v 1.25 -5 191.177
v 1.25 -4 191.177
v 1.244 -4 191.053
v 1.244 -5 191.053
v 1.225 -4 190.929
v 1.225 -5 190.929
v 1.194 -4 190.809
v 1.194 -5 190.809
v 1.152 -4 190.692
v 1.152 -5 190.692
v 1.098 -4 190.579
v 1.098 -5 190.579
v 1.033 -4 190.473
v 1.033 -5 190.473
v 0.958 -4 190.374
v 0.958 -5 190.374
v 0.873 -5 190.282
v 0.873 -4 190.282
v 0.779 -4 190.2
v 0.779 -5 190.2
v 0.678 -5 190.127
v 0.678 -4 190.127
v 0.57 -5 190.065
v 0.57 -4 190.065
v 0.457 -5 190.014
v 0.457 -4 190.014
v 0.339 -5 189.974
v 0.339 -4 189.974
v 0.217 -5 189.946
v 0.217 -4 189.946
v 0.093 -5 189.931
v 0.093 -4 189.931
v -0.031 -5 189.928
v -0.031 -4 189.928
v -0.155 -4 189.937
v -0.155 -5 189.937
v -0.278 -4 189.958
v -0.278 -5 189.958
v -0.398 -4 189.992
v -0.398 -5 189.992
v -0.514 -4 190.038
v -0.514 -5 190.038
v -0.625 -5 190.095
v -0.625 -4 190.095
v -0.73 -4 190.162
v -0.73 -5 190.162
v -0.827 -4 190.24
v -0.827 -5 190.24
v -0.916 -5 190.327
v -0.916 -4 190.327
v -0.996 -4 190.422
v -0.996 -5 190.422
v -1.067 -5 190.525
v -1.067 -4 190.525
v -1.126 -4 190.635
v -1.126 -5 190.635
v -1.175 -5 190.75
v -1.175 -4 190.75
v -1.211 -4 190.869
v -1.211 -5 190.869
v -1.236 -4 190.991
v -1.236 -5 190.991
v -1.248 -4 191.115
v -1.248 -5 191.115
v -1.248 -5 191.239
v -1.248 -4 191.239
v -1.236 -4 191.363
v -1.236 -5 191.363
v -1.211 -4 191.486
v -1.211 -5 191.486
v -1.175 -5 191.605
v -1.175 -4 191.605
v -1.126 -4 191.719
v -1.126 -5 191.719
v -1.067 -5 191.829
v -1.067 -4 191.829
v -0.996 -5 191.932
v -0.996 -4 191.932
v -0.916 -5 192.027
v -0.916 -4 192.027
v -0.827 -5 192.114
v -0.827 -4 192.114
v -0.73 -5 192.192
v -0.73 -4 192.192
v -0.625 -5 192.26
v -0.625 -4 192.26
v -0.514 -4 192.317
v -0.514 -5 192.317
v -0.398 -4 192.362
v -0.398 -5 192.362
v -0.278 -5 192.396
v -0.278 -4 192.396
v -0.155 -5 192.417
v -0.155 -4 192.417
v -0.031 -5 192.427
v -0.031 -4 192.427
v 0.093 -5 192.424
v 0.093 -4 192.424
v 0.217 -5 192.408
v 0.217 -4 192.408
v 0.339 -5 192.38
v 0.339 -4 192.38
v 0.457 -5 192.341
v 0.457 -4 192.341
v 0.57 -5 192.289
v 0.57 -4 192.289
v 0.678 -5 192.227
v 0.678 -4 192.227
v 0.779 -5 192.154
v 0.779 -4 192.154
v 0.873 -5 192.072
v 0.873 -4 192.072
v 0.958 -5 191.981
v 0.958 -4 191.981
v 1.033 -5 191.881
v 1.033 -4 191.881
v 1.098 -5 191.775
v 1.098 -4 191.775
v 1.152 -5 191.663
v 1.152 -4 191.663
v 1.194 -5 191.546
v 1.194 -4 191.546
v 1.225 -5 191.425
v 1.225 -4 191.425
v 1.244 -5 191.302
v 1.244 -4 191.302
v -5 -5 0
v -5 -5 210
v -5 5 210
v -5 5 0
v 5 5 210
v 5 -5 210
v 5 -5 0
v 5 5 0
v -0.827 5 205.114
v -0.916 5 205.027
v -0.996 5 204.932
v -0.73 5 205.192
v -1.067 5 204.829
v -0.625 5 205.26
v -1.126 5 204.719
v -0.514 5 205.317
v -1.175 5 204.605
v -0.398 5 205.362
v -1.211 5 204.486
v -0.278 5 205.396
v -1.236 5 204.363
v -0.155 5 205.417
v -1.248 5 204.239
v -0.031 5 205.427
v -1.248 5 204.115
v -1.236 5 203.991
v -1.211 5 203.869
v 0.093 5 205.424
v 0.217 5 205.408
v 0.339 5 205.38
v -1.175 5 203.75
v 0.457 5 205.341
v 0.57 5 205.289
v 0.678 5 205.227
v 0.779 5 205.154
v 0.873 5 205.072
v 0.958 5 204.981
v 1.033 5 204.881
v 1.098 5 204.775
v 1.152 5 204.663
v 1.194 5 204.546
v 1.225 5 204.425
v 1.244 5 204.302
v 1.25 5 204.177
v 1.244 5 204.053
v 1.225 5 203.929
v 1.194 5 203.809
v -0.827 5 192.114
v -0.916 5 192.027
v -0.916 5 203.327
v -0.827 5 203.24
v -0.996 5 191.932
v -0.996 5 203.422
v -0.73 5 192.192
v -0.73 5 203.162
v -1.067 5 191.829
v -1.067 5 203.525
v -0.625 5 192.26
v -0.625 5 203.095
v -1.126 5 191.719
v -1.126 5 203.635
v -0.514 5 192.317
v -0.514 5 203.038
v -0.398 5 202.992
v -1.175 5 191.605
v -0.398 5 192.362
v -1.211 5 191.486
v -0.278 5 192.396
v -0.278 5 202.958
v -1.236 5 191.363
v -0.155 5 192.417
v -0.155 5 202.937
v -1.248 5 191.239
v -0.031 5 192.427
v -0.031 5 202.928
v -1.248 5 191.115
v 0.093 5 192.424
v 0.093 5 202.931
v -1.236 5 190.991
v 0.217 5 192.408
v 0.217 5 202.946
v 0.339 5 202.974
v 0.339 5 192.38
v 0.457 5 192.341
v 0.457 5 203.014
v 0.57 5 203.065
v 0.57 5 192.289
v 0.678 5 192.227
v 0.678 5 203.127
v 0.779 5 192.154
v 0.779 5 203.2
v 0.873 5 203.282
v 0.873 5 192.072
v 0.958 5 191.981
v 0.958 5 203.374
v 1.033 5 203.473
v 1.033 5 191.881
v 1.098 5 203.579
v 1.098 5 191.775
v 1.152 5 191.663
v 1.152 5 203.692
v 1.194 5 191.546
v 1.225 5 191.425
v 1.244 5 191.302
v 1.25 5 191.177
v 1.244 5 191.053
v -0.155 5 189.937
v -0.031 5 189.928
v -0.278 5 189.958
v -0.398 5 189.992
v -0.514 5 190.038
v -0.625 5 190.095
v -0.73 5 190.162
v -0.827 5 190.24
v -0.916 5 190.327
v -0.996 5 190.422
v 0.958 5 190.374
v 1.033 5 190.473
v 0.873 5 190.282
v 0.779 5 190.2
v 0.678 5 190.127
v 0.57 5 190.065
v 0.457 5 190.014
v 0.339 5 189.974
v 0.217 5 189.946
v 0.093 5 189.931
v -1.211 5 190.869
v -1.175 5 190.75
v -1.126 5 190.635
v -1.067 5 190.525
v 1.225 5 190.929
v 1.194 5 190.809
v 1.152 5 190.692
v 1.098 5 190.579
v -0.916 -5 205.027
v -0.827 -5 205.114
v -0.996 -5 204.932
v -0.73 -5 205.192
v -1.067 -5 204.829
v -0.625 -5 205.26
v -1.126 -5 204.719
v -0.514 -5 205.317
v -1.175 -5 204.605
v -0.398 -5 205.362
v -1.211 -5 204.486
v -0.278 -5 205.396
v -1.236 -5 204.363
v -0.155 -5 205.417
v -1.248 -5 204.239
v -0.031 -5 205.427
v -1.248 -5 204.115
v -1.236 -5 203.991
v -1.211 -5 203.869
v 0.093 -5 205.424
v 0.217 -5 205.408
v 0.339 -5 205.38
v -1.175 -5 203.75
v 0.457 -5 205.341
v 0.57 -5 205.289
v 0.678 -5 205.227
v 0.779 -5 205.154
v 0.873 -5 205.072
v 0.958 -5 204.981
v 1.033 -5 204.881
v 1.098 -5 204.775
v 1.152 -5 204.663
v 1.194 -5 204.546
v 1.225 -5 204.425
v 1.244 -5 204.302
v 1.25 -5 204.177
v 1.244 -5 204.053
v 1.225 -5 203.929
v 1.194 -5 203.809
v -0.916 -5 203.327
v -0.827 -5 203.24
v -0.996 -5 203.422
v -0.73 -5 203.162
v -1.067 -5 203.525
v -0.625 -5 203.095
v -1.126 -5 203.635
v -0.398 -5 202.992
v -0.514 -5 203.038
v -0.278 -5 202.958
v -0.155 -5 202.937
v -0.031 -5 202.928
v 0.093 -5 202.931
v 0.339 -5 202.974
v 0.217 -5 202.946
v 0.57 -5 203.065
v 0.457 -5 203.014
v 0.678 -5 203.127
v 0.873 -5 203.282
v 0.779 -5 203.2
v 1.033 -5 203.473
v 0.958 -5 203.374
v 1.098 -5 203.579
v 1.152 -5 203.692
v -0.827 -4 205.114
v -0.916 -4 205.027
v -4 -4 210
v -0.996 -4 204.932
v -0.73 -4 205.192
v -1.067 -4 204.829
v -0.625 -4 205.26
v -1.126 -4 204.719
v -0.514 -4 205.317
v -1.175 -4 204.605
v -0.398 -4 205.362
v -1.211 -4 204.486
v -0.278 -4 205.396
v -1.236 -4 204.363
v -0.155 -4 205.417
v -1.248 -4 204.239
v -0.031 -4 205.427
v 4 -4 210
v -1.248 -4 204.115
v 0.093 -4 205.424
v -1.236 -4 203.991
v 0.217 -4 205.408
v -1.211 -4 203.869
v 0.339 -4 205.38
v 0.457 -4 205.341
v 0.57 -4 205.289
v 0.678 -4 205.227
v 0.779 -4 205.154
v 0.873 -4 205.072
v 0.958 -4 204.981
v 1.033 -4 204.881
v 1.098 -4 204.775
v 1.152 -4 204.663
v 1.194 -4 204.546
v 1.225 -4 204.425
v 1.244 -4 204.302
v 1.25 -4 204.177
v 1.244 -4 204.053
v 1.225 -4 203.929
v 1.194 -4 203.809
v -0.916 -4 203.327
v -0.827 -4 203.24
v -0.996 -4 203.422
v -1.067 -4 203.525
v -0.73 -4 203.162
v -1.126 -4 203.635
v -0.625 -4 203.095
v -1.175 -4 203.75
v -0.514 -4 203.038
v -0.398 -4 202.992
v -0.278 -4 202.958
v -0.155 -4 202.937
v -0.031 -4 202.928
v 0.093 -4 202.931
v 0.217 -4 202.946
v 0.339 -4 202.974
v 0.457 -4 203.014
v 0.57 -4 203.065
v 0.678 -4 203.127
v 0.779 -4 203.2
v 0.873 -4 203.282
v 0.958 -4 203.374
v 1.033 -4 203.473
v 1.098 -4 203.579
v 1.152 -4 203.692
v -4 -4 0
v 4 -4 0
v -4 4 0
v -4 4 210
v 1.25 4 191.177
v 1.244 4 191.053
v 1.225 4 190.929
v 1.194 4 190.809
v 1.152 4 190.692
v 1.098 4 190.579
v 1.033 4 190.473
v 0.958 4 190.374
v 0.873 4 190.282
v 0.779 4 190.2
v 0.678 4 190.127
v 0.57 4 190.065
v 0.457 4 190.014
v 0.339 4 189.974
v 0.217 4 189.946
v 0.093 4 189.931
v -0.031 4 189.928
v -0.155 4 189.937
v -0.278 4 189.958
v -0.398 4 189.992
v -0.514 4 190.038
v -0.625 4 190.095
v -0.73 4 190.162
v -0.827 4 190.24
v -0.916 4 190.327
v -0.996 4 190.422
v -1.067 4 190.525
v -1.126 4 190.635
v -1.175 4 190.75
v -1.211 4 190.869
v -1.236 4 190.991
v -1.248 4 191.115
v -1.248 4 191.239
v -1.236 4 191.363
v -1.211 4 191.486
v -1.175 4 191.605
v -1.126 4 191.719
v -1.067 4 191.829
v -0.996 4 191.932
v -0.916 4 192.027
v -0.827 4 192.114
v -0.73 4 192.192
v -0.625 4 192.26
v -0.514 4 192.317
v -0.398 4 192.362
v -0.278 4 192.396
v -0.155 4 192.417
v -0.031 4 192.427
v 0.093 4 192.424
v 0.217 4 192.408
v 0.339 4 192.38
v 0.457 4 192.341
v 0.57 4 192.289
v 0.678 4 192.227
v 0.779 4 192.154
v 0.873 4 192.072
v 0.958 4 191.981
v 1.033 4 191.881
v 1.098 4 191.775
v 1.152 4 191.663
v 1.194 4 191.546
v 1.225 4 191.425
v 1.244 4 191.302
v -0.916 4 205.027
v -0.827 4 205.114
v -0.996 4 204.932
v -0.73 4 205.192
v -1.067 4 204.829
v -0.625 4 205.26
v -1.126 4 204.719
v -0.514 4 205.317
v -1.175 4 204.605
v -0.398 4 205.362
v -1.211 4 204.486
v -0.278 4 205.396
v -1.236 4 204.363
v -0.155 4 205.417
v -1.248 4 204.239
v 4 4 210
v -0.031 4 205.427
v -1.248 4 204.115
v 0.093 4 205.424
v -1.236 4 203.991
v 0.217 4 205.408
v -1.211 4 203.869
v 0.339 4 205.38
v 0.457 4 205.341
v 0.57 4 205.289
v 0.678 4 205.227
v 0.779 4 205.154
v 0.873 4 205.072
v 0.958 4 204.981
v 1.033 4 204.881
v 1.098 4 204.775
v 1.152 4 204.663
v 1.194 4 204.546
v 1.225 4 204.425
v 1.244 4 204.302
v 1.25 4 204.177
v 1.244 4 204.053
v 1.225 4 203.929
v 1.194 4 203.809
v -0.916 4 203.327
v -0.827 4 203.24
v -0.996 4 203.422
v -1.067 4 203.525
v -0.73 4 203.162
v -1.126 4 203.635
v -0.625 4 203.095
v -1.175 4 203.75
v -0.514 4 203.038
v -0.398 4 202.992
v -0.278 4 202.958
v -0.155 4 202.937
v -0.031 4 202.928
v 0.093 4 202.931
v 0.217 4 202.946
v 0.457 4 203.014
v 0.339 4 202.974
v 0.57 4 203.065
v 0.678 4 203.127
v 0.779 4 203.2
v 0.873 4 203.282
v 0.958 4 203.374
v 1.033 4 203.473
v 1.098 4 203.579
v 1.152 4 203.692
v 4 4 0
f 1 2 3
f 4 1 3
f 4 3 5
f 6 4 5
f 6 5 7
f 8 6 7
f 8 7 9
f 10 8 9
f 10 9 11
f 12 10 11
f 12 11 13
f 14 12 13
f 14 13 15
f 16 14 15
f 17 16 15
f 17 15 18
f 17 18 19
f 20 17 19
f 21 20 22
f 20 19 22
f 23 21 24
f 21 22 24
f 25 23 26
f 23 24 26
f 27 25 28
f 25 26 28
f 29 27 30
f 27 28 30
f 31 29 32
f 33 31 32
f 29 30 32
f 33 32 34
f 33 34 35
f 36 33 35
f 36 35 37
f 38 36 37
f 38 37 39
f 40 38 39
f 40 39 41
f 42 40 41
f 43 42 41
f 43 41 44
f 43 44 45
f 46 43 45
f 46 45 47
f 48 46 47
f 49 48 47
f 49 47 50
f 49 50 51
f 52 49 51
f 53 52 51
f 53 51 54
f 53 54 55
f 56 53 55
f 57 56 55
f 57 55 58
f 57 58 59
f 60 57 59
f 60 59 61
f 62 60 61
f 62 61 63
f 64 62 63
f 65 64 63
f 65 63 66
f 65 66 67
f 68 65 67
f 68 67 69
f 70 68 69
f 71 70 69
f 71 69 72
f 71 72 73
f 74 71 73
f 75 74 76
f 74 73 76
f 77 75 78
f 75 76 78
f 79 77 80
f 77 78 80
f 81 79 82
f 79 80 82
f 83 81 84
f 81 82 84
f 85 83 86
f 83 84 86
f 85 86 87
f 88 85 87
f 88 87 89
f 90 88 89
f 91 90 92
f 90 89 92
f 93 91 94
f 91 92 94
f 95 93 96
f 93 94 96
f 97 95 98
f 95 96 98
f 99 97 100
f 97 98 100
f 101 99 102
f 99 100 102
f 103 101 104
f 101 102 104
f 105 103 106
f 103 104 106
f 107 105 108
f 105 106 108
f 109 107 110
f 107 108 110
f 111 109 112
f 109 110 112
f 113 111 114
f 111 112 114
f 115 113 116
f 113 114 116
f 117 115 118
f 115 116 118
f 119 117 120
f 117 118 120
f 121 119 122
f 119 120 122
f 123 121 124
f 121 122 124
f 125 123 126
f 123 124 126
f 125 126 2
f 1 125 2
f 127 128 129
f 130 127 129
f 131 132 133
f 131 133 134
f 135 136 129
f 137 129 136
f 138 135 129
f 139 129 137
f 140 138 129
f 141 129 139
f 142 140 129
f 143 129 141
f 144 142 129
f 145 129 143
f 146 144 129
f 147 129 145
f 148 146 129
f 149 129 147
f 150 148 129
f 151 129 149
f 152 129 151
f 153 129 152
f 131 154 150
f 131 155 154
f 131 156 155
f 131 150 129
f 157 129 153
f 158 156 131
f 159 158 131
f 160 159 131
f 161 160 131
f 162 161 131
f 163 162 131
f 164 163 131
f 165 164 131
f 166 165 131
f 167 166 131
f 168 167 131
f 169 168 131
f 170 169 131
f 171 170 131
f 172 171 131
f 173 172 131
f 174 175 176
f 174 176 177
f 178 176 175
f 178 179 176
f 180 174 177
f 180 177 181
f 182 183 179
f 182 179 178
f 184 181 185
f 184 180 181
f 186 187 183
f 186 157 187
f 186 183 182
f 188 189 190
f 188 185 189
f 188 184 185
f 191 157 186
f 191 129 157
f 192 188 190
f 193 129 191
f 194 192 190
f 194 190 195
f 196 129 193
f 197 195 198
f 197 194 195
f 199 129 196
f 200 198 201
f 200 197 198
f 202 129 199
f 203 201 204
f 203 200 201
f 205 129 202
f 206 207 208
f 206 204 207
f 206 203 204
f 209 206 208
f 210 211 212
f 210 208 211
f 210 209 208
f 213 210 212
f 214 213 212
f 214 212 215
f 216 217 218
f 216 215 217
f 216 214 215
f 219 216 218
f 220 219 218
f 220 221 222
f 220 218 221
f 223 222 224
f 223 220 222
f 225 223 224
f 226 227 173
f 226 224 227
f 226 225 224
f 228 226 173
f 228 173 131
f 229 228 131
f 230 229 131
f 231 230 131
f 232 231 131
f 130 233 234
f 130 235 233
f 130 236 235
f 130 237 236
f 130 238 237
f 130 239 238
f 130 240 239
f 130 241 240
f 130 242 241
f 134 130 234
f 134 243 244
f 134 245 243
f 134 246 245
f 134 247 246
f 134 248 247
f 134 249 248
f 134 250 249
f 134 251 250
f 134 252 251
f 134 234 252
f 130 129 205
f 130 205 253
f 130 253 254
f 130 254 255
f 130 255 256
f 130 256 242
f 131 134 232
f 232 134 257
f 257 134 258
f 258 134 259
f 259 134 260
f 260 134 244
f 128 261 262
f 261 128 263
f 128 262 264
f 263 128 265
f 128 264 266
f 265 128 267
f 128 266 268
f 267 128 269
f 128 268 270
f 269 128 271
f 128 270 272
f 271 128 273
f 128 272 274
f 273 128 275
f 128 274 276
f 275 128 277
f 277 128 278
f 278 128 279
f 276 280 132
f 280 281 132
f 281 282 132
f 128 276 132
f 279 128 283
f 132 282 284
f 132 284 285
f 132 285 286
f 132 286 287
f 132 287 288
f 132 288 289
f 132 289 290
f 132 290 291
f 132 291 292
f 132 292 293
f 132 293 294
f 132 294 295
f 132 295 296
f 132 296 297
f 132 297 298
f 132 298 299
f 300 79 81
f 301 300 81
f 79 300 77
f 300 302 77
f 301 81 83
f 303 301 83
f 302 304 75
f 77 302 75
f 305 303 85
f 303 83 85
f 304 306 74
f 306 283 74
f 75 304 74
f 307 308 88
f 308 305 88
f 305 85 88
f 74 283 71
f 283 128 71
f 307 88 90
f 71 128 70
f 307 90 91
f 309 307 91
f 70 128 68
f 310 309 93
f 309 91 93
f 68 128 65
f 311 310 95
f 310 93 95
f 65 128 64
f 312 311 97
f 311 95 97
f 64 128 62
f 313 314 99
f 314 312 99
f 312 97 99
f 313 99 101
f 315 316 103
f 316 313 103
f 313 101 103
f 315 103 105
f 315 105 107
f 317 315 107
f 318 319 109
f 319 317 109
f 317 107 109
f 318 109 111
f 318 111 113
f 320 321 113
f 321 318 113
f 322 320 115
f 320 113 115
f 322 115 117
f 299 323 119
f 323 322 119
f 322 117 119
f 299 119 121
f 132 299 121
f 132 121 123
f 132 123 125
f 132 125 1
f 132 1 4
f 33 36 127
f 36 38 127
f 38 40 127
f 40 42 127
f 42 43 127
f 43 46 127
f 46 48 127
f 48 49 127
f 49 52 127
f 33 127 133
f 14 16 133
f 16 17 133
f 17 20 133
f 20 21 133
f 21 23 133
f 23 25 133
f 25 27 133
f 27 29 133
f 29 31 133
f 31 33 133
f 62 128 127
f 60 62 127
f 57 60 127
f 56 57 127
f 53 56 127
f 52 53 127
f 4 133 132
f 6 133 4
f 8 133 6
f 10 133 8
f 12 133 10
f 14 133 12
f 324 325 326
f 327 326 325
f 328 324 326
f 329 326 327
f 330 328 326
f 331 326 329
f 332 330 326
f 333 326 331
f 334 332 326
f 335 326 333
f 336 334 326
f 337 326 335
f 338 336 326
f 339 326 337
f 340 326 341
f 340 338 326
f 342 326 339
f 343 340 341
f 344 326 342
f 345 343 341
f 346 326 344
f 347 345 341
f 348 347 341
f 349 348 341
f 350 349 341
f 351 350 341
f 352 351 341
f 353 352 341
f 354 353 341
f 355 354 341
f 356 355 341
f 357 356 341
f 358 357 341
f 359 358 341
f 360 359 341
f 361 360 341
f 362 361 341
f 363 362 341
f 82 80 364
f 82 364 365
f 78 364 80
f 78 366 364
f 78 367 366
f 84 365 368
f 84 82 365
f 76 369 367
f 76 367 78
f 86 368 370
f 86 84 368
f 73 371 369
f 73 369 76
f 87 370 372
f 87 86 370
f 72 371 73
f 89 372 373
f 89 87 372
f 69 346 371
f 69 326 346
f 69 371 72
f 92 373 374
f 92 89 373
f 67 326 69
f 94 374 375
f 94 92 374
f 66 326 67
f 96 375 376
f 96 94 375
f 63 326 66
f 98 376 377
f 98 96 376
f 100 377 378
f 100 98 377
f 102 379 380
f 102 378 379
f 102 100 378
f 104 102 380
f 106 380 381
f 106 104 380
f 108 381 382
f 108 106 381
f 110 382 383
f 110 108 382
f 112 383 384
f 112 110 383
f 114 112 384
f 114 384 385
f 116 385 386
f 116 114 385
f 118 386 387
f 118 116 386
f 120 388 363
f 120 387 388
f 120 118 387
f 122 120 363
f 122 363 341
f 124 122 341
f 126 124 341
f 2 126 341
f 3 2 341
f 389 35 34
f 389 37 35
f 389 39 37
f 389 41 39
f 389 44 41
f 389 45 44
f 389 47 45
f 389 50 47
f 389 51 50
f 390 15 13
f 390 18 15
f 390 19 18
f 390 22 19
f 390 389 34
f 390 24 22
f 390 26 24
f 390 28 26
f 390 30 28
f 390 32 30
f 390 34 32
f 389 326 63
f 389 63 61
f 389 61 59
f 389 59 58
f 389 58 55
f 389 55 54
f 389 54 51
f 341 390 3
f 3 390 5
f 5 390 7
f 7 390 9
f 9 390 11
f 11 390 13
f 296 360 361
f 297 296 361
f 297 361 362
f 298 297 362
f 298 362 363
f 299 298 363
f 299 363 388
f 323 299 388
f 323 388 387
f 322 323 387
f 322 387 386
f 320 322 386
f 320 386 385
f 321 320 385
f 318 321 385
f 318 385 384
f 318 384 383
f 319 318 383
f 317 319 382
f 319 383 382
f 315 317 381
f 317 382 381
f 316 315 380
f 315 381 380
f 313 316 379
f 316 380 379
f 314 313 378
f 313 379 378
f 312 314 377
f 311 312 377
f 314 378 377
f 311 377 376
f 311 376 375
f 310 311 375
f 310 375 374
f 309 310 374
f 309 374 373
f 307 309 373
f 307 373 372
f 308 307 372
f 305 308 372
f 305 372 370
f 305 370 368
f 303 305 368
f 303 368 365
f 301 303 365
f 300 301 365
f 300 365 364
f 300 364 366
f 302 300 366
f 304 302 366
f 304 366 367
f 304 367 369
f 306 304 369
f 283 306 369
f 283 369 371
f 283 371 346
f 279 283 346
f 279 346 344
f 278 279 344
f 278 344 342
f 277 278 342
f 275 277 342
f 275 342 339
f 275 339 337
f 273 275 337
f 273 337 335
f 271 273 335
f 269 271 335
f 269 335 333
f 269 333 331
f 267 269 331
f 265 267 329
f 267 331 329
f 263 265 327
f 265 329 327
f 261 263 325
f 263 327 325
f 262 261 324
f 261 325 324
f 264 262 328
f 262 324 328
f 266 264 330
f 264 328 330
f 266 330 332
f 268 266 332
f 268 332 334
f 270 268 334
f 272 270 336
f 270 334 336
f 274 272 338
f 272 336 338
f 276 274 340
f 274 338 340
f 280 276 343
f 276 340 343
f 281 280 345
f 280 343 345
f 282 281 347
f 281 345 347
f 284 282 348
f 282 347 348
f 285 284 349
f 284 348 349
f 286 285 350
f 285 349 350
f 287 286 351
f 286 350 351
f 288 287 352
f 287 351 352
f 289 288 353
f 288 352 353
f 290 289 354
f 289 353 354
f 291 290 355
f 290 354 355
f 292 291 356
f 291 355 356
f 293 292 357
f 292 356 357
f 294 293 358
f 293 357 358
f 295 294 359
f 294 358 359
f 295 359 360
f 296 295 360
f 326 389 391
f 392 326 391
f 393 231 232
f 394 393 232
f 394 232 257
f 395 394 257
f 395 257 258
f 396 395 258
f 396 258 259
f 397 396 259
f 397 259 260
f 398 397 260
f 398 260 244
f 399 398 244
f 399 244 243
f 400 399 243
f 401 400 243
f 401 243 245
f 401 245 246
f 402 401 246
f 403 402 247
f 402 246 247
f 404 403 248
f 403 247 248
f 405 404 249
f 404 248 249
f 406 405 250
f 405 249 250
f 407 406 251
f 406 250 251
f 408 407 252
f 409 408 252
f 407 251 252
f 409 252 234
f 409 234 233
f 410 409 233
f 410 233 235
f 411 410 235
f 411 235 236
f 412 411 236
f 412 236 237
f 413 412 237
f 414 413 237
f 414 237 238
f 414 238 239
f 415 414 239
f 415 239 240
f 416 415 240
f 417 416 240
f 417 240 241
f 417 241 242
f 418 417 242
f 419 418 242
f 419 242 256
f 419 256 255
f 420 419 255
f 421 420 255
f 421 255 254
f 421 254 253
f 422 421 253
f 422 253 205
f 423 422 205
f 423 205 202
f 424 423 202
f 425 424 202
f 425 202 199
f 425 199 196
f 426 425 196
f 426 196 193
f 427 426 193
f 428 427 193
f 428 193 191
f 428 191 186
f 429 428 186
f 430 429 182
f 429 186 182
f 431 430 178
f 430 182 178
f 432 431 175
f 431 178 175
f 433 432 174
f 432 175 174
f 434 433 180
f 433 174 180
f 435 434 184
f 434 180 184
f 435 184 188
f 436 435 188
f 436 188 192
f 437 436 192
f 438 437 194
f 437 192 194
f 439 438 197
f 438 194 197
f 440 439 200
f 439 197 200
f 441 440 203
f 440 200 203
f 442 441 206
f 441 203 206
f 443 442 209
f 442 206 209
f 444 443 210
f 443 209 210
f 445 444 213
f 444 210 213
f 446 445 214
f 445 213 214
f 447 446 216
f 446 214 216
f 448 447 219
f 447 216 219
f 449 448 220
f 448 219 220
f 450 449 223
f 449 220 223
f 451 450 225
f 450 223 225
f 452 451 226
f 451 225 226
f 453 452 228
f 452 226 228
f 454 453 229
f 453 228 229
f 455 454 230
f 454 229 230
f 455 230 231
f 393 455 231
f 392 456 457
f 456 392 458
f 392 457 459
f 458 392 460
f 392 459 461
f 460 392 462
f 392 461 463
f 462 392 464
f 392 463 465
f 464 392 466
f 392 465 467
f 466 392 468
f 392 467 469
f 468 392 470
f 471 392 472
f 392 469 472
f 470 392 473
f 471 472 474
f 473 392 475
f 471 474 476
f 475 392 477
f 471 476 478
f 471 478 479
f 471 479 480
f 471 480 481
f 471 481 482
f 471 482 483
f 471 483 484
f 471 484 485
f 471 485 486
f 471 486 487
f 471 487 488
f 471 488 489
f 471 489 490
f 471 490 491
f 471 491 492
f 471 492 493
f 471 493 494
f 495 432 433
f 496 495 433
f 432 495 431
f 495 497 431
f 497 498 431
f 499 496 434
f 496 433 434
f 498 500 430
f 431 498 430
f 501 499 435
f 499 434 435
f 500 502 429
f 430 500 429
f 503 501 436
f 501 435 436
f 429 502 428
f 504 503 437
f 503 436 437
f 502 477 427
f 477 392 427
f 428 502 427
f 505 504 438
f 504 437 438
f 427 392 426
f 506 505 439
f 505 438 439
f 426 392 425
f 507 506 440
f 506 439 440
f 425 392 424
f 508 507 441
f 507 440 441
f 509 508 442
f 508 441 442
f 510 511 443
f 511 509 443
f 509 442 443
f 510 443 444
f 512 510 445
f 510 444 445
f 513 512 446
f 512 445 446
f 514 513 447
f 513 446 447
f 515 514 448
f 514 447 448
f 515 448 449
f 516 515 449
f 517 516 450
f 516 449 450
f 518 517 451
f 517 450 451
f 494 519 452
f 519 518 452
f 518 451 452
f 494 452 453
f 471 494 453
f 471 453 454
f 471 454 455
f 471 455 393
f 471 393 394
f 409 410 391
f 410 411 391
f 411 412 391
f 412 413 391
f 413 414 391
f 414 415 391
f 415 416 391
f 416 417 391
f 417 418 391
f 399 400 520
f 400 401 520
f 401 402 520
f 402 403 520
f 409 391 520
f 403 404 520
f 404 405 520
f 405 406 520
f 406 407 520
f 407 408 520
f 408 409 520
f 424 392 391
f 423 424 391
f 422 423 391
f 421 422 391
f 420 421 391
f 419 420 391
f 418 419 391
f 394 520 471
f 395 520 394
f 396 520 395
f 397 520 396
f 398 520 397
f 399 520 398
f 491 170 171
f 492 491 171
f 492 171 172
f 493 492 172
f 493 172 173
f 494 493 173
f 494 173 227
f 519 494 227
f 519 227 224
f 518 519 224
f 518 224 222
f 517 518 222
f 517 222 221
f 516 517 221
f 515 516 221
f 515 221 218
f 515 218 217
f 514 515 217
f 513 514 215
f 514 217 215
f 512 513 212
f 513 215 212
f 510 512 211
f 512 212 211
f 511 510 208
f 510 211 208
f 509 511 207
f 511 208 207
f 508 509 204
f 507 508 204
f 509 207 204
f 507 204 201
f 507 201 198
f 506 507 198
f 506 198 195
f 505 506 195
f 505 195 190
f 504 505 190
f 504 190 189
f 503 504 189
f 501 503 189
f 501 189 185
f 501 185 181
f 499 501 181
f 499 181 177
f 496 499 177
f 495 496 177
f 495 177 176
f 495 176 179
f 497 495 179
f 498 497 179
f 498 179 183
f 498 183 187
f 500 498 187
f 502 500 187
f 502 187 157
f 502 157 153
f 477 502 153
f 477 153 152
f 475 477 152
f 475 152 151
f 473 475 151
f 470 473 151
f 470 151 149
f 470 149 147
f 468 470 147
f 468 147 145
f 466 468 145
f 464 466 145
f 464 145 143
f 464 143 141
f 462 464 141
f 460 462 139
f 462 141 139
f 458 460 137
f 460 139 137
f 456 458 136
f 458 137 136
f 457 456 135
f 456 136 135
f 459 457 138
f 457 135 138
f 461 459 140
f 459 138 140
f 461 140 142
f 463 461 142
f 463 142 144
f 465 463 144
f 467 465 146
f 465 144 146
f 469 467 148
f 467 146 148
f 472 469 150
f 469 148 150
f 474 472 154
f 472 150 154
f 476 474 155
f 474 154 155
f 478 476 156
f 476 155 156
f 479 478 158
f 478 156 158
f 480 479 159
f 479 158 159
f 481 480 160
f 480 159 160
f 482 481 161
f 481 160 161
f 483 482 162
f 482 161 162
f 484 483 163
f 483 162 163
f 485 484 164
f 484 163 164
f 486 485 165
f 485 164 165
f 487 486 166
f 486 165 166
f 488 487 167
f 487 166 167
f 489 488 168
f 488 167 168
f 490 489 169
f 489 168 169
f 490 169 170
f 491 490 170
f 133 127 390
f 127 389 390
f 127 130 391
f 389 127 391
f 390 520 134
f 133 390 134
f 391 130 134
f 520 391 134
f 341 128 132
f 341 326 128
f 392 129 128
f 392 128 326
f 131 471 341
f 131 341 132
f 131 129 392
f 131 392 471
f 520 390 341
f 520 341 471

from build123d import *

# Parameters (mm, degrees)
SKETCH_1_W      = 10
SKETCH_1_H      = 10
SKETCH_1_W_2    = 8
SKETCH_1_H_2    = 8
EXTRUDE_1_DEPTH = 210
HOLE_WIZARD_1_D = 2.5


with BuildPart() as part:
    # 草图1 → 凸台-拉伸1 (new body)
    with BuildSketch(Plane.XY):
        Rectangle(SKETCH_1_W, SKETCH_1_H)
        Rectangle(SKETCH_1_W_2, SKETCH_1_H_2, mode=Mode.SUBTRACT)
    extrude(amount=EXTRUDE_1_DEPTH)

    # 孔1 (through all)
    with Locations(Plane(origin=(0, -5, 0), x_dir=(-1, 0, 0), z_dir=(0, -1, 0))):
        with Locations((0, -204.177136039), (0, -191.177136039), (-130, -204.177136039), (-130, -191.177136039)):
            Hole(HOLE_WIZARD_1_D / 2)


solid = part.part
